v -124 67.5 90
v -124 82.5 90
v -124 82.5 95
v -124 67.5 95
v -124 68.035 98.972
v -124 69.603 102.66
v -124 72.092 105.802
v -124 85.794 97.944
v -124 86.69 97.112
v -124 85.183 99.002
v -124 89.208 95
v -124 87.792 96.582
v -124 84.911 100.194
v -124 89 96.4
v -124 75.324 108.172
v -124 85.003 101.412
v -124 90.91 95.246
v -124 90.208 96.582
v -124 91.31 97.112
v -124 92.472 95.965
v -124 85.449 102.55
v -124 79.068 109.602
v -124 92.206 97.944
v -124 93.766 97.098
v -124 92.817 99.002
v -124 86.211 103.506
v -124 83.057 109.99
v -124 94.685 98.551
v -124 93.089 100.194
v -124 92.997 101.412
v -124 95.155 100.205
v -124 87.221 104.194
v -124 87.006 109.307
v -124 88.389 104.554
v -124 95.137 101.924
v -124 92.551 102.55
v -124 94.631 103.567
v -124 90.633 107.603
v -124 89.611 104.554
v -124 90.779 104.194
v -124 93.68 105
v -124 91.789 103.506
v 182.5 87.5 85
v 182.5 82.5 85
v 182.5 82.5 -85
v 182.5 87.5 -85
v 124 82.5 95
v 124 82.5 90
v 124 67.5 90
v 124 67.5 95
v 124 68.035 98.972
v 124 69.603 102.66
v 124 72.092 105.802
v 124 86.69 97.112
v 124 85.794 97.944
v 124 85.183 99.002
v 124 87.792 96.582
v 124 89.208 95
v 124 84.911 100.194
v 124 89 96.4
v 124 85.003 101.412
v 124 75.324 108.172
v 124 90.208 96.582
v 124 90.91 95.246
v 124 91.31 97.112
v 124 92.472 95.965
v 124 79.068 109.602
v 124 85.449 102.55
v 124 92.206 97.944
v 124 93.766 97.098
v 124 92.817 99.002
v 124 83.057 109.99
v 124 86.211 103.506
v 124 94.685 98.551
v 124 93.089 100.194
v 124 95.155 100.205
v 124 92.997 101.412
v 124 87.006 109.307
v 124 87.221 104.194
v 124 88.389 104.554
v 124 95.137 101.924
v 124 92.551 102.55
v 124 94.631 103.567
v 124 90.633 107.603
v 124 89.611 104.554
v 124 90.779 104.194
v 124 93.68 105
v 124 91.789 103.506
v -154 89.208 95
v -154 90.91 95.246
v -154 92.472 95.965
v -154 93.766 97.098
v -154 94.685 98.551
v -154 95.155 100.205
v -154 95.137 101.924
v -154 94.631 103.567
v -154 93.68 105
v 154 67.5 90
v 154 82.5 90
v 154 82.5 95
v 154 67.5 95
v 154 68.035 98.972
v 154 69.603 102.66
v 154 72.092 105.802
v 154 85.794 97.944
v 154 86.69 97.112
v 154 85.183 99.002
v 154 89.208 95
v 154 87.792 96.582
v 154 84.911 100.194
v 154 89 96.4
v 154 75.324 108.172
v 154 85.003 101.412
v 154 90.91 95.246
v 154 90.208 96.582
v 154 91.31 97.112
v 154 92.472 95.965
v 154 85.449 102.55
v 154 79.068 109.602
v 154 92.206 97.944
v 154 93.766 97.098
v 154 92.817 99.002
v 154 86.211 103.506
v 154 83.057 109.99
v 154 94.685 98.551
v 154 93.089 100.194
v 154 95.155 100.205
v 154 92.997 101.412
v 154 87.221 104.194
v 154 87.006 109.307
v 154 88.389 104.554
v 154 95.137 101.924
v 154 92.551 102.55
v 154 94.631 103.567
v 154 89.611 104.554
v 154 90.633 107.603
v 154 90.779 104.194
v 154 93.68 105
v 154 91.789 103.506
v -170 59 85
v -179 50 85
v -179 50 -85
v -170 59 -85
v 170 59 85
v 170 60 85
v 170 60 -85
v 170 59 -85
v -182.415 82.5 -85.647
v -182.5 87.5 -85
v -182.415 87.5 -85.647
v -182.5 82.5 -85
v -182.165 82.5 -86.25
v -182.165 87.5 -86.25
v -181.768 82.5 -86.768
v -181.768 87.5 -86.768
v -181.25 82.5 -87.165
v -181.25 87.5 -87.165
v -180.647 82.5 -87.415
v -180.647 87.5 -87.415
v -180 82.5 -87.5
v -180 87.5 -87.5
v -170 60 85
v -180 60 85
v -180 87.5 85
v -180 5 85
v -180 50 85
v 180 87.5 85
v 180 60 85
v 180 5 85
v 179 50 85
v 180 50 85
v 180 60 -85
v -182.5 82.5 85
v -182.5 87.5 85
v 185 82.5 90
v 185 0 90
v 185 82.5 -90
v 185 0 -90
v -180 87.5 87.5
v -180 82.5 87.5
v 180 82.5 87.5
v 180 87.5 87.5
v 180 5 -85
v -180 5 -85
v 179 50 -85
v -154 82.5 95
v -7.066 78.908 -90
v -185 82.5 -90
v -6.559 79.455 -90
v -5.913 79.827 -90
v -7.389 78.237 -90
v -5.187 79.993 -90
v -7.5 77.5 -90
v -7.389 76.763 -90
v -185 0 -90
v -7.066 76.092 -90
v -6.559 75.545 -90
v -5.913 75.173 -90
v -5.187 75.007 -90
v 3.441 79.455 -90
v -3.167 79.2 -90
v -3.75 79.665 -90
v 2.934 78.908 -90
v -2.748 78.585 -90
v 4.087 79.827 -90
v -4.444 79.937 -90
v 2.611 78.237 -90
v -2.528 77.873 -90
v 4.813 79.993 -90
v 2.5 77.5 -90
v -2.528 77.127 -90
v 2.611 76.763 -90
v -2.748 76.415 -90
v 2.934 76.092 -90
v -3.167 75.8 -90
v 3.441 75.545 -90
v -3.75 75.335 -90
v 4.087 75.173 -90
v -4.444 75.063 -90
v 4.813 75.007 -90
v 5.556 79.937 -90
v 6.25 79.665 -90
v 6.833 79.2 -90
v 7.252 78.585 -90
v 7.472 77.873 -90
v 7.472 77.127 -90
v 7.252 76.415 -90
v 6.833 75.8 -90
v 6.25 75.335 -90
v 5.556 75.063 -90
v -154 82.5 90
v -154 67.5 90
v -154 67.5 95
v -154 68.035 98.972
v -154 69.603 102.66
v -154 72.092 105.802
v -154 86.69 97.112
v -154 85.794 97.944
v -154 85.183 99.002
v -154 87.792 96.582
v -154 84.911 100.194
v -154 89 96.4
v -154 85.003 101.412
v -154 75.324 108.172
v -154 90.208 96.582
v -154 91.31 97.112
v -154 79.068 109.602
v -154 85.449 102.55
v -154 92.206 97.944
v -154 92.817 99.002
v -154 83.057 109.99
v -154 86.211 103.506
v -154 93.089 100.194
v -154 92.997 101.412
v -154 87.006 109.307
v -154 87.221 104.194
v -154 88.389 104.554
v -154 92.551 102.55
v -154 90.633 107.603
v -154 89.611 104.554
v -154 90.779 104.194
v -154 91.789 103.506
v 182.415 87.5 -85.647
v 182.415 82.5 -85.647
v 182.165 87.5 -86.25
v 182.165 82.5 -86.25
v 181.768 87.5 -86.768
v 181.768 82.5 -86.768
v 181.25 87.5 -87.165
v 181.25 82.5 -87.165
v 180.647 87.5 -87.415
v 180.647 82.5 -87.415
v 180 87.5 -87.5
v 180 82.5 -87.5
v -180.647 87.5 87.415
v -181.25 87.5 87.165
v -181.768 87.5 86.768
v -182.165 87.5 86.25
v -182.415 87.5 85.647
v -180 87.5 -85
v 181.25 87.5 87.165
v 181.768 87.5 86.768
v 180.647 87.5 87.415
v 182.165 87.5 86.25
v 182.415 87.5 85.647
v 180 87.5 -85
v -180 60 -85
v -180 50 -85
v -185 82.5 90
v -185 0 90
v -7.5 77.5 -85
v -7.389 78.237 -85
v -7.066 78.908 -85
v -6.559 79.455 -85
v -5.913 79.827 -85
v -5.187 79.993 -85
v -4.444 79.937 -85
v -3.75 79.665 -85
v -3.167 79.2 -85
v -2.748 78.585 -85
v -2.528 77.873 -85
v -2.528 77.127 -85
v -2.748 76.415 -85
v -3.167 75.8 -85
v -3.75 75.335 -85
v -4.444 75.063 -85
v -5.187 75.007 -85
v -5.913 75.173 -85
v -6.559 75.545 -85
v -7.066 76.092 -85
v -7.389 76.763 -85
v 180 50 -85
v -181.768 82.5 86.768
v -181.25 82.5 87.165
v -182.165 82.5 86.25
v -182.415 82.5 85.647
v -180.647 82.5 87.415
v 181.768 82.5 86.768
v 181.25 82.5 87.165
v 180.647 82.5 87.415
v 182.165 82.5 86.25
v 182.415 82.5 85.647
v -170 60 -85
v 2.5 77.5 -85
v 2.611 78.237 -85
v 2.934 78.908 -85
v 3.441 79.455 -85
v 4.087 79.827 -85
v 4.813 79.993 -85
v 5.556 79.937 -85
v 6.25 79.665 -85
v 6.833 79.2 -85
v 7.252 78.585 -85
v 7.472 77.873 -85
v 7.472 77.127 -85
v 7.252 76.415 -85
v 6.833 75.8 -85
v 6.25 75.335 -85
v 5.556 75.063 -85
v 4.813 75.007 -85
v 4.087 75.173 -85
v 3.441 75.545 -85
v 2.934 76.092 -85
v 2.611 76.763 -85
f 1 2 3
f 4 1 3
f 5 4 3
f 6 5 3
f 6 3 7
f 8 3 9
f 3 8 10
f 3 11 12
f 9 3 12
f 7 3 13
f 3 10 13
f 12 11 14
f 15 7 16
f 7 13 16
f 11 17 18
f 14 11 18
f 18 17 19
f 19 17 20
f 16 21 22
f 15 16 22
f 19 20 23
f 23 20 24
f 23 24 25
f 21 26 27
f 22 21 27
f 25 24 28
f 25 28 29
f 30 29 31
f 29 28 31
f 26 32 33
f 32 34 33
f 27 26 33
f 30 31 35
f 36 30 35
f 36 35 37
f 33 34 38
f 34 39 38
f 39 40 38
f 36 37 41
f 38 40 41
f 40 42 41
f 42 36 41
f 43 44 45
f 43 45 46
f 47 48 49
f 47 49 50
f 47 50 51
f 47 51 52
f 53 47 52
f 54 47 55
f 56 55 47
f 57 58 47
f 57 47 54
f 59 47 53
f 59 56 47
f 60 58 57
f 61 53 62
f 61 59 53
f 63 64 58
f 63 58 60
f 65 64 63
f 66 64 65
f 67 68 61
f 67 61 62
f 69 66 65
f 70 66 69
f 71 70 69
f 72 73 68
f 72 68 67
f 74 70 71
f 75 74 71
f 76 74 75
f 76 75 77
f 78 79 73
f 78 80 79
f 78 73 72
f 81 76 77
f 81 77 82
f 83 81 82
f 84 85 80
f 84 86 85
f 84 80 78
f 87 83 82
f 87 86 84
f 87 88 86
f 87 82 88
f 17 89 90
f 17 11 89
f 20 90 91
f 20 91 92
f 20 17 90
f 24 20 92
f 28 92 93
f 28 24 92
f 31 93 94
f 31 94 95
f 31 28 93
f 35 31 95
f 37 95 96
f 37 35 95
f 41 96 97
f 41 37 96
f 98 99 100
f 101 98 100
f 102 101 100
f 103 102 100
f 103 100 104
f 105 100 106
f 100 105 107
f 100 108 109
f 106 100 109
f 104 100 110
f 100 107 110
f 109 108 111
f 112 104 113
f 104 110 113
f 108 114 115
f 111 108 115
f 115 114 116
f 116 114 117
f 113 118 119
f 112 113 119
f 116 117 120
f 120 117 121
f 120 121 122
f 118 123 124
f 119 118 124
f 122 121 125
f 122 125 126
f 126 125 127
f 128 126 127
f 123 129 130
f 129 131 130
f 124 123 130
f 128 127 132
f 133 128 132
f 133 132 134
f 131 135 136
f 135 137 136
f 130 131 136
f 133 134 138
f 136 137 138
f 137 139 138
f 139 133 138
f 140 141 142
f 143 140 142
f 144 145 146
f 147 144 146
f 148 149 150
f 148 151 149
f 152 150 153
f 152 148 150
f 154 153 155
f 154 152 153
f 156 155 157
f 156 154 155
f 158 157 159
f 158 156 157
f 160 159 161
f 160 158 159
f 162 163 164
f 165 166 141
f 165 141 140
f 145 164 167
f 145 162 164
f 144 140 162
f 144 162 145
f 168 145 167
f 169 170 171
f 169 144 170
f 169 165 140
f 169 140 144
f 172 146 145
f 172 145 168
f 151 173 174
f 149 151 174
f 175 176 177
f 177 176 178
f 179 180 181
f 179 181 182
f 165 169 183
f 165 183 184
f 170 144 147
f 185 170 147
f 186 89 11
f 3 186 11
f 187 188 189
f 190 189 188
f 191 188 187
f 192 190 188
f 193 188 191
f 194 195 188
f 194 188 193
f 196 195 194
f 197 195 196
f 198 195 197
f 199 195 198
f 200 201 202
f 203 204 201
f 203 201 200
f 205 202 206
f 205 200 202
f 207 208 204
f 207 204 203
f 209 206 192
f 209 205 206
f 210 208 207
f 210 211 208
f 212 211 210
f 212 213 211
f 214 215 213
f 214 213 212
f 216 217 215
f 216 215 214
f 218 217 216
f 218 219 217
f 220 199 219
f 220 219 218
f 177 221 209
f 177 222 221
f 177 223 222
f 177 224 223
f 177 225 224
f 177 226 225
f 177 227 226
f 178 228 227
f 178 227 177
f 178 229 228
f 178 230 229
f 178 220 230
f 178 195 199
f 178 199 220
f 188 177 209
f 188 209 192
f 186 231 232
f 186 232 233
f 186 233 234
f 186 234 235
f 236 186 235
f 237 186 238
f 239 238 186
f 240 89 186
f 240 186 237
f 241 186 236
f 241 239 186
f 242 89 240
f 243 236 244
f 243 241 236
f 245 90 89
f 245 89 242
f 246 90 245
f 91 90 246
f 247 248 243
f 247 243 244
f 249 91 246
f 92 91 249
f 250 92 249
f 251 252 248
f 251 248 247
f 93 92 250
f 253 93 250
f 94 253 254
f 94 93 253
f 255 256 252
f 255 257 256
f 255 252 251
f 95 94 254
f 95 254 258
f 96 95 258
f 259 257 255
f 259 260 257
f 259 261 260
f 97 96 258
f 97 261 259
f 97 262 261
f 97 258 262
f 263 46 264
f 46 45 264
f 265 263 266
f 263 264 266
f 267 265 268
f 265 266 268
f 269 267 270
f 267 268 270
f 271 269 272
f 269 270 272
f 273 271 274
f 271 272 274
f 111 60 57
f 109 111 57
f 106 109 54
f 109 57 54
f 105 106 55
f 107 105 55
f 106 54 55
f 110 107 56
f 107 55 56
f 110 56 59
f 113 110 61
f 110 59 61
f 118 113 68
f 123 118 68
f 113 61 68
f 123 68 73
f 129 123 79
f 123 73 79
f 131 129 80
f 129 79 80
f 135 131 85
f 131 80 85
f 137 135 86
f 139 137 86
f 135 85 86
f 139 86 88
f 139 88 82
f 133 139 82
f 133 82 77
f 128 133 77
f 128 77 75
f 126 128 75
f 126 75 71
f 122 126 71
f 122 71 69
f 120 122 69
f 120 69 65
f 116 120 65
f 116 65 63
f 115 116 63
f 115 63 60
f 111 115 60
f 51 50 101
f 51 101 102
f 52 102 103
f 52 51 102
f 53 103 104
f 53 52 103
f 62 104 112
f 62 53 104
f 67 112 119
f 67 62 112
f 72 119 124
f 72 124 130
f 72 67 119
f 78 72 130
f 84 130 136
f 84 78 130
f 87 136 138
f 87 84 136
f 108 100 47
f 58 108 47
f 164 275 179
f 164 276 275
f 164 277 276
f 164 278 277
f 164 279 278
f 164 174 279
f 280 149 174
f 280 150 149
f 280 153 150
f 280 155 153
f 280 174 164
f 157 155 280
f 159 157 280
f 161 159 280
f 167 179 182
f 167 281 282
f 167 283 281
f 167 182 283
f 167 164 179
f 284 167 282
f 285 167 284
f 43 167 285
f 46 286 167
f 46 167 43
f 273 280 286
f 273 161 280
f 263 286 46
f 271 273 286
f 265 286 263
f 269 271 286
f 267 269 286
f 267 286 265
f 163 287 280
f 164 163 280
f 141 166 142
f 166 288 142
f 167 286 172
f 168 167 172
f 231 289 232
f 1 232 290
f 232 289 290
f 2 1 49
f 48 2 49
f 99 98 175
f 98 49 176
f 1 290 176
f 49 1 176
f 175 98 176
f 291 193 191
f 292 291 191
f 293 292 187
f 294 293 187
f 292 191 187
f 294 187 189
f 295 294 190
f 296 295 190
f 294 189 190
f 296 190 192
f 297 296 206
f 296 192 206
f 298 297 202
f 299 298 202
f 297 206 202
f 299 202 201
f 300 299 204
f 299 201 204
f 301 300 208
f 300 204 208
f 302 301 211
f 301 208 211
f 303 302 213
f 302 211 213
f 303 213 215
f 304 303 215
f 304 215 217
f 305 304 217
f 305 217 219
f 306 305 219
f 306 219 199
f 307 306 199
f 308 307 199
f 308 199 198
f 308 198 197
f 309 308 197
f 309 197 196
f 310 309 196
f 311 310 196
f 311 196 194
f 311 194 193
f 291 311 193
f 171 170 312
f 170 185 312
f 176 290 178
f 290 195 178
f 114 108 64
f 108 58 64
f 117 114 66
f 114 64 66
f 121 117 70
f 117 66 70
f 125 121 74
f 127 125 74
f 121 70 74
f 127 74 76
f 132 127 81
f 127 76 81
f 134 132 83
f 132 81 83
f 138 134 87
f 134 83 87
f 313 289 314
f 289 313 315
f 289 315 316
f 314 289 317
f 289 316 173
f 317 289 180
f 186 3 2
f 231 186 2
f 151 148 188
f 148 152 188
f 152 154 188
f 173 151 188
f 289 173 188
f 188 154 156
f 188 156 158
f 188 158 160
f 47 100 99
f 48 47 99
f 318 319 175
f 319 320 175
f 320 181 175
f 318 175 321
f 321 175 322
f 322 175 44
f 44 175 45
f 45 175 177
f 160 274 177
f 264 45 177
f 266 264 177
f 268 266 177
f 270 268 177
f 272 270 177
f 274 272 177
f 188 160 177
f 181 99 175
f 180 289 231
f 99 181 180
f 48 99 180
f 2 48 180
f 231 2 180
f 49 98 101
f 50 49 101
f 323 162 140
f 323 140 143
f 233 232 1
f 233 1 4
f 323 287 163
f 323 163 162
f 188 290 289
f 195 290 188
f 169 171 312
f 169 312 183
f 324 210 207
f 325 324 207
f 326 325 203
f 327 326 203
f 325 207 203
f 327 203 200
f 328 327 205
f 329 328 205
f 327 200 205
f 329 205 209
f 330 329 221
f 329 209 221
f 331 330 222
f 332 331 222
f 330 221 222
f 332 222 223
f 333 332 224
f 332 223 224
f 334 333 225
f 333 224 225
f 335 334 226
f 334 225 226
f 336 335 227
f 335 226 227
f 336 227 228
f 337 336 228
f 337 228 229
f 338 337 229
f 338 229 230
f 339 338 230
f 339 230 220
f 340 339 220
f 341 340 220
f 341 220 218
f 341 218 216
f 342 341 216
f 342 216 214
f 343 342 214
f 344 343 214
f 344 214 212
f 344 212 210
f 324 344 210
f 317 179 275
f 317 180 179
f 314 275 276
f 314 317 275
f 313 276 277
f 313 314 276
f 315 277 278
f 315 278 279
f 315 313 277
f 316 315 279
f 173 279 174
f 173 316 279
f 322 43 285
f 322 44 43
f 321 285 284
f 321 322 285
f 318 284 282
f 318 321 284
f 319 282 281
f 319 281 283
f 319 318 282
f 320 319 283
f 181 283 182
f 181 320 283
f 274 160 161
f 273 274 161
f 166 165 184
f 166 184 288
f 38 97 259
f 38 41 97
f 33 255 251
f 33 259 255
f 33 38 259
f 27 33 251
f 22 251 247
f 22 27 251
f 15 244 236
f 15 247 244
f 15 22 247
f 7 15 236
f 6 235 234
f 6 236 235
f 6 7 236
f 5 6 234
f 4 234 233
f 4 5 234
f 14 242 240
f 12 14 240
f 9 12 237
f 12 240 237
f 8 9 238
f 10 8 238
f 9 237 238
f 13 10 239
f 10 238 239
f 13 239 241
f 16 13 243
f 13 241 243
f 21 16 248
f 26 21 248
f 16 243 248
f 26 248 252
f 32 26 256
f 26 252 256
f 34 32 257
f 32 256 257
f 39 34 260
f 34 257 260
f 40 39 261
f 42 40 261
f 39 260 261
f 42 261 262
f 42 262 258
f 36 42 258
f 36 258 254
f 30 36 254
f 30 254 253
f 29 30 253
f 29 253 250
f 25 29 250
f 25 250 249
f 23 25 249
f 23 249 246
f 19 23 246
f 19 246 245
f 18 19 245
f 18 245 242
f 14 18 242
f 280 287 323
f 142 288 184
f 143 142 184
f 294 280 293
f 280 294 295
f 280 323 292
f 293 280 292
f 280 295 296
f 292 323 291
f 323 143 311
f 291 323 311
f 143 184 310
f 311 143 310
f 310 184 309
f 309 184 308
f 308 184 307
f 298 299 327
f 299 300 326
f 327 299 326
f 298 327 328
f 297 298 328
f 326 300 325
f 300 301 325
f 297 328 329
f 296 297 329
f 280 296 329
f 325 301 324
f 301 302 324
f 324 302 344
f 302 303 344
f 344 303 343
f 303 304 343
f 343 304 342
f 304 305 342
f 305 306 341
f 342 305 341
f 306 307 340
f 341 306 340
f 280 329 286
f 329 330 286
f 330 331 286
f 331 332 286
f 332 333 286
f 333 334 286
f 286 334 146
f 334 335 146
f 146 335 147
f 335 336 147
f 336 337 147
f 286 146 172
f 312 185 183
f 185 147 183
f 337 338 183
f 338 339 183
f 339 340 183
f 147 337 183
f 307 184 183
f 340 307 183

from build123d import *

# Parameters (mm, degrees)
BOSS_EXTRUDE1_DEPTH     = 85
SKETCH3_W               = 370
SKETCH3_H               = 5
BOSS_EXTRUDE2_DEPTH     = 87.5
SKETCH4_W               = 2.5
SKETCH4_H               = 5
CUT_EXTRUDE1_DEPTH      = 391.712490202
CUT_EXTRUDE2_DEPTH      = 271.90127353
CUT_EXTRUDE2_DEPTH_BACK = 271.90127353
SKETCH5_W               = 2.5
SKETCH5_H               = 5
FILLET1_R               = 2.5
SKETCH6_W               = 10
SKETCH6_H               = 170
BOSS_EXTRUDE3_DEPTH     = 10
FILLET2_SIZE            = 9
SKETCH8_W               = 30
SKETCH8_H               = 15
REVOLVE1_ANGLE          = 180
FILLET9_R               = 6
SKETCH12_W              = 5
SKETCH12_H              = 15
BOSS_EXTRUDE5_DEPTH     = 30
SKETCH9_R               = 4.1
CUT_EXTRUDE4_DEPTH      = 370.495940438
FILLET11_R              = 6
SKETCH13_R              = 2.5
CUT_EXTRUDE5_DEPTH      = 30


with BuildPart() as part:
    # Sketch2 → Boss-Extrude1 (new, symmetric)
    with BuildSketch(Plane.XY):
        Polygon((-185, 0), (185, 0), (185, 82.5), (182.5, 82.5), (182.5, 87.5), (180, 87.5), (180, 80.5), (180, 5), (-180, 5), (-180, 80.5), (-180, 87.5), (-182.5, 87.5), (-182.5, 82.5), (-185, 82.5), align=None)
    extrude(amount=BOSS_EXTRUDE1_DEPTH, both=True)

    # Sketch3 → Boss-Extrude2 (add)
    with BuildSketch(Plane(origin=(0, 0, 0), x_dir=(1, 0, 0), z_dir=(0, 1, 0))):
        with Locations((0, -87.5)):
            Rectangle(SKETCH3_W, SKETCH3_H)
        with Locations((0, 87.5)):
            Rectangle(SKETCH3_W, SKETCH3_H)
    extrude(amount=BOSS_EXTRUDE2_DEPTH)

    # Sketch4 → Cut-Extrude1 (cut, through all)
    with BuildSketch(Plane(origin=(185, 0, 0), x_dir=(0, 0, -1), z_dir=(1, 0, 0))):
        with Locations((-88.75, 85)):
            Rectangle(SKETCH4_W, SKETCH4_H)
        with Locations((88.75, 85)):
            Rectangle(SKETCH4_W, SKETCH4_H)
    extrude(amount=-CUT_EXTRUDE1_DEPTH, mode=Mode.SUBTRACT)

    # Sketch5 → Cut-Extrude2 (cut, two sides: drawn at the far end of the back side and taken through both)
    with BuildSketch(Plane(origin=(0, 0, -87.5), x_dir=(-1, 0, 0), z_dir=(0, 0, -1)).offset(-CUT_EXTRUDE2_DEPTH_BACK)):
        with Locations((-183.75, 85)):
            Rectangle(SKETCH5_W, SKETCH5_H)
        with Locations((183.75, 85)):
            Rectangle(SKETCH5_W, SKETCH5_H)
    extrude(amount=CUT_EXTRUDE2_DEPTH + CUT_EXTRUDE2_DEPTH_BACK, mode=Mode.SUBTRACT)

    # Fillet1
    fillet1_edges = [part.edges().sort_by_distance(p)[0] for p in [
        (182.5, 85, 87.5),
        (182.5, 85, -87.5),
        (-182.5, 85, 87.5),
        (-182.5, 85, -87.5),
    ]]
    fillet(fillet1_edges, radius=FILLET1_R)

    # Sketch6 → Boss-Extrude3 (add)
    with BuildSketch(Plane(origin=(0, 60, 0), x_dir=(1, 0, 0), z_dir=(0, 1, 0))):
        with Locations((-175, 0)):
            Rectangle(SKETCH6_W, SKETCH6_H)
        with Locations((175, 0)):
            Rectangle(SKETCH6_W, SKETCH6_H)
    extrude(amount=-BOSS_EXTRUDE3_DEPTH)

    # Fillet2
    fillet2_edges = [part.edges().sort_by_distance(p)[0] for p in [
        (-170, 50, 0),
        (170, 50, 0),
    ]]
    chamfer(fillet2_edges, length=FILLET2_SIZE)



with BuildPart() as body_2:
    # Sketch8 → Revolve1 (revolve, symmetric)
    with BuildSketch(Plane(origin=(0, 82.5, 0), x_dir=(1, 0, 0), z_dir=(0, 1, 0))) as revolve1_sk:
        with Locations((-139, -102.5)):
            Rectangle(SKETCH8_W, SKETCH8_H)
    revolve1 = revolve(axis=Axis((184.702128339, 82.5, 95), (-1, 0, 0)), revolution_arc=REVOLVE1_ANGLE / 2)
    revolve1 = revolve1 + revolve(revolve1_sk.sketch, axis=Axis((184.702128339, 82.5, 95), (1, 0, 0)), revolution_arc=REVOLVE1_ANGLE / 2)

    # Fillet9
    fillet9_edges = [body_2.edges().sort_by_distance(p)[0] for p in [
        (-139, 97.5, 95),
    ]]
    fillet(fillet9_edges, radius=FILLET9_R)


with BuildPart() as part_1:
    add(part.part)

    add(body_2.part)  # Boss-Extrude5 merges body 2
    # Sketch12 → Boss-Extrude5 (add)
    with BuildSketch(Plane.ZY.offset(154)):
        with Locations((92.5, 75)):
            Rectangle(SKETCH12_W, SKETCH12_H)
    boss_extrude5 = extrude(amount=-BOSS_EXTRUDE5_DEPTH)

    # Mirror4: Boss-Extrude5 across plane
    add(boss_extrude5.mirror(Plane(origin=(0, 0, 0), x_dir=(0, 0, 1), z_dir=(1, 0, 0))))

    # Mirror5: Revolve1 across plane
    add(revolve1.mirror(Plane(origin=(0, 0, 0), x_dir=(0, 0, 1), z_dir=(1, 0, 0))))

    # Sketch9 → Cut-Extrude4 (cut, through all)
    with BuildSketch(Plane.ZY.offset(154)):
        with Locations(Location((100.5, 89, 0), (0, 0, 180))):
            Circle(SKETCH9_R)
    extrude(amount=-CUT_EXTRUDE4_DEPTH, mode=Mode.SUBTRACT)

    # Fillet11
    fillet11_edges = [part_1.edges().sort_by_distance(p)[0] for p in [
        (139, 97.5, 95),
    ]]
    fillet(fillet11_edges, radius=FILLET11_R)

    # Sketch13 → Cut-Extrude5 (cut)
    with BuildSketch(Plane(origin=(0, 0, -90), x_dir=(-1, 0, 0), z_dir=(0, 0, -1))):
        with Locations((-5, 77.5)):
            Circle(SKETCH13_R)
        with Locations((5, 77.5)):
            Circle(SKETCH13_R)
    extrude(amount=-CUT_EXTRUDE5_DEPTH, mode=Mode.SUBTRACT)


solid = part_1.part
